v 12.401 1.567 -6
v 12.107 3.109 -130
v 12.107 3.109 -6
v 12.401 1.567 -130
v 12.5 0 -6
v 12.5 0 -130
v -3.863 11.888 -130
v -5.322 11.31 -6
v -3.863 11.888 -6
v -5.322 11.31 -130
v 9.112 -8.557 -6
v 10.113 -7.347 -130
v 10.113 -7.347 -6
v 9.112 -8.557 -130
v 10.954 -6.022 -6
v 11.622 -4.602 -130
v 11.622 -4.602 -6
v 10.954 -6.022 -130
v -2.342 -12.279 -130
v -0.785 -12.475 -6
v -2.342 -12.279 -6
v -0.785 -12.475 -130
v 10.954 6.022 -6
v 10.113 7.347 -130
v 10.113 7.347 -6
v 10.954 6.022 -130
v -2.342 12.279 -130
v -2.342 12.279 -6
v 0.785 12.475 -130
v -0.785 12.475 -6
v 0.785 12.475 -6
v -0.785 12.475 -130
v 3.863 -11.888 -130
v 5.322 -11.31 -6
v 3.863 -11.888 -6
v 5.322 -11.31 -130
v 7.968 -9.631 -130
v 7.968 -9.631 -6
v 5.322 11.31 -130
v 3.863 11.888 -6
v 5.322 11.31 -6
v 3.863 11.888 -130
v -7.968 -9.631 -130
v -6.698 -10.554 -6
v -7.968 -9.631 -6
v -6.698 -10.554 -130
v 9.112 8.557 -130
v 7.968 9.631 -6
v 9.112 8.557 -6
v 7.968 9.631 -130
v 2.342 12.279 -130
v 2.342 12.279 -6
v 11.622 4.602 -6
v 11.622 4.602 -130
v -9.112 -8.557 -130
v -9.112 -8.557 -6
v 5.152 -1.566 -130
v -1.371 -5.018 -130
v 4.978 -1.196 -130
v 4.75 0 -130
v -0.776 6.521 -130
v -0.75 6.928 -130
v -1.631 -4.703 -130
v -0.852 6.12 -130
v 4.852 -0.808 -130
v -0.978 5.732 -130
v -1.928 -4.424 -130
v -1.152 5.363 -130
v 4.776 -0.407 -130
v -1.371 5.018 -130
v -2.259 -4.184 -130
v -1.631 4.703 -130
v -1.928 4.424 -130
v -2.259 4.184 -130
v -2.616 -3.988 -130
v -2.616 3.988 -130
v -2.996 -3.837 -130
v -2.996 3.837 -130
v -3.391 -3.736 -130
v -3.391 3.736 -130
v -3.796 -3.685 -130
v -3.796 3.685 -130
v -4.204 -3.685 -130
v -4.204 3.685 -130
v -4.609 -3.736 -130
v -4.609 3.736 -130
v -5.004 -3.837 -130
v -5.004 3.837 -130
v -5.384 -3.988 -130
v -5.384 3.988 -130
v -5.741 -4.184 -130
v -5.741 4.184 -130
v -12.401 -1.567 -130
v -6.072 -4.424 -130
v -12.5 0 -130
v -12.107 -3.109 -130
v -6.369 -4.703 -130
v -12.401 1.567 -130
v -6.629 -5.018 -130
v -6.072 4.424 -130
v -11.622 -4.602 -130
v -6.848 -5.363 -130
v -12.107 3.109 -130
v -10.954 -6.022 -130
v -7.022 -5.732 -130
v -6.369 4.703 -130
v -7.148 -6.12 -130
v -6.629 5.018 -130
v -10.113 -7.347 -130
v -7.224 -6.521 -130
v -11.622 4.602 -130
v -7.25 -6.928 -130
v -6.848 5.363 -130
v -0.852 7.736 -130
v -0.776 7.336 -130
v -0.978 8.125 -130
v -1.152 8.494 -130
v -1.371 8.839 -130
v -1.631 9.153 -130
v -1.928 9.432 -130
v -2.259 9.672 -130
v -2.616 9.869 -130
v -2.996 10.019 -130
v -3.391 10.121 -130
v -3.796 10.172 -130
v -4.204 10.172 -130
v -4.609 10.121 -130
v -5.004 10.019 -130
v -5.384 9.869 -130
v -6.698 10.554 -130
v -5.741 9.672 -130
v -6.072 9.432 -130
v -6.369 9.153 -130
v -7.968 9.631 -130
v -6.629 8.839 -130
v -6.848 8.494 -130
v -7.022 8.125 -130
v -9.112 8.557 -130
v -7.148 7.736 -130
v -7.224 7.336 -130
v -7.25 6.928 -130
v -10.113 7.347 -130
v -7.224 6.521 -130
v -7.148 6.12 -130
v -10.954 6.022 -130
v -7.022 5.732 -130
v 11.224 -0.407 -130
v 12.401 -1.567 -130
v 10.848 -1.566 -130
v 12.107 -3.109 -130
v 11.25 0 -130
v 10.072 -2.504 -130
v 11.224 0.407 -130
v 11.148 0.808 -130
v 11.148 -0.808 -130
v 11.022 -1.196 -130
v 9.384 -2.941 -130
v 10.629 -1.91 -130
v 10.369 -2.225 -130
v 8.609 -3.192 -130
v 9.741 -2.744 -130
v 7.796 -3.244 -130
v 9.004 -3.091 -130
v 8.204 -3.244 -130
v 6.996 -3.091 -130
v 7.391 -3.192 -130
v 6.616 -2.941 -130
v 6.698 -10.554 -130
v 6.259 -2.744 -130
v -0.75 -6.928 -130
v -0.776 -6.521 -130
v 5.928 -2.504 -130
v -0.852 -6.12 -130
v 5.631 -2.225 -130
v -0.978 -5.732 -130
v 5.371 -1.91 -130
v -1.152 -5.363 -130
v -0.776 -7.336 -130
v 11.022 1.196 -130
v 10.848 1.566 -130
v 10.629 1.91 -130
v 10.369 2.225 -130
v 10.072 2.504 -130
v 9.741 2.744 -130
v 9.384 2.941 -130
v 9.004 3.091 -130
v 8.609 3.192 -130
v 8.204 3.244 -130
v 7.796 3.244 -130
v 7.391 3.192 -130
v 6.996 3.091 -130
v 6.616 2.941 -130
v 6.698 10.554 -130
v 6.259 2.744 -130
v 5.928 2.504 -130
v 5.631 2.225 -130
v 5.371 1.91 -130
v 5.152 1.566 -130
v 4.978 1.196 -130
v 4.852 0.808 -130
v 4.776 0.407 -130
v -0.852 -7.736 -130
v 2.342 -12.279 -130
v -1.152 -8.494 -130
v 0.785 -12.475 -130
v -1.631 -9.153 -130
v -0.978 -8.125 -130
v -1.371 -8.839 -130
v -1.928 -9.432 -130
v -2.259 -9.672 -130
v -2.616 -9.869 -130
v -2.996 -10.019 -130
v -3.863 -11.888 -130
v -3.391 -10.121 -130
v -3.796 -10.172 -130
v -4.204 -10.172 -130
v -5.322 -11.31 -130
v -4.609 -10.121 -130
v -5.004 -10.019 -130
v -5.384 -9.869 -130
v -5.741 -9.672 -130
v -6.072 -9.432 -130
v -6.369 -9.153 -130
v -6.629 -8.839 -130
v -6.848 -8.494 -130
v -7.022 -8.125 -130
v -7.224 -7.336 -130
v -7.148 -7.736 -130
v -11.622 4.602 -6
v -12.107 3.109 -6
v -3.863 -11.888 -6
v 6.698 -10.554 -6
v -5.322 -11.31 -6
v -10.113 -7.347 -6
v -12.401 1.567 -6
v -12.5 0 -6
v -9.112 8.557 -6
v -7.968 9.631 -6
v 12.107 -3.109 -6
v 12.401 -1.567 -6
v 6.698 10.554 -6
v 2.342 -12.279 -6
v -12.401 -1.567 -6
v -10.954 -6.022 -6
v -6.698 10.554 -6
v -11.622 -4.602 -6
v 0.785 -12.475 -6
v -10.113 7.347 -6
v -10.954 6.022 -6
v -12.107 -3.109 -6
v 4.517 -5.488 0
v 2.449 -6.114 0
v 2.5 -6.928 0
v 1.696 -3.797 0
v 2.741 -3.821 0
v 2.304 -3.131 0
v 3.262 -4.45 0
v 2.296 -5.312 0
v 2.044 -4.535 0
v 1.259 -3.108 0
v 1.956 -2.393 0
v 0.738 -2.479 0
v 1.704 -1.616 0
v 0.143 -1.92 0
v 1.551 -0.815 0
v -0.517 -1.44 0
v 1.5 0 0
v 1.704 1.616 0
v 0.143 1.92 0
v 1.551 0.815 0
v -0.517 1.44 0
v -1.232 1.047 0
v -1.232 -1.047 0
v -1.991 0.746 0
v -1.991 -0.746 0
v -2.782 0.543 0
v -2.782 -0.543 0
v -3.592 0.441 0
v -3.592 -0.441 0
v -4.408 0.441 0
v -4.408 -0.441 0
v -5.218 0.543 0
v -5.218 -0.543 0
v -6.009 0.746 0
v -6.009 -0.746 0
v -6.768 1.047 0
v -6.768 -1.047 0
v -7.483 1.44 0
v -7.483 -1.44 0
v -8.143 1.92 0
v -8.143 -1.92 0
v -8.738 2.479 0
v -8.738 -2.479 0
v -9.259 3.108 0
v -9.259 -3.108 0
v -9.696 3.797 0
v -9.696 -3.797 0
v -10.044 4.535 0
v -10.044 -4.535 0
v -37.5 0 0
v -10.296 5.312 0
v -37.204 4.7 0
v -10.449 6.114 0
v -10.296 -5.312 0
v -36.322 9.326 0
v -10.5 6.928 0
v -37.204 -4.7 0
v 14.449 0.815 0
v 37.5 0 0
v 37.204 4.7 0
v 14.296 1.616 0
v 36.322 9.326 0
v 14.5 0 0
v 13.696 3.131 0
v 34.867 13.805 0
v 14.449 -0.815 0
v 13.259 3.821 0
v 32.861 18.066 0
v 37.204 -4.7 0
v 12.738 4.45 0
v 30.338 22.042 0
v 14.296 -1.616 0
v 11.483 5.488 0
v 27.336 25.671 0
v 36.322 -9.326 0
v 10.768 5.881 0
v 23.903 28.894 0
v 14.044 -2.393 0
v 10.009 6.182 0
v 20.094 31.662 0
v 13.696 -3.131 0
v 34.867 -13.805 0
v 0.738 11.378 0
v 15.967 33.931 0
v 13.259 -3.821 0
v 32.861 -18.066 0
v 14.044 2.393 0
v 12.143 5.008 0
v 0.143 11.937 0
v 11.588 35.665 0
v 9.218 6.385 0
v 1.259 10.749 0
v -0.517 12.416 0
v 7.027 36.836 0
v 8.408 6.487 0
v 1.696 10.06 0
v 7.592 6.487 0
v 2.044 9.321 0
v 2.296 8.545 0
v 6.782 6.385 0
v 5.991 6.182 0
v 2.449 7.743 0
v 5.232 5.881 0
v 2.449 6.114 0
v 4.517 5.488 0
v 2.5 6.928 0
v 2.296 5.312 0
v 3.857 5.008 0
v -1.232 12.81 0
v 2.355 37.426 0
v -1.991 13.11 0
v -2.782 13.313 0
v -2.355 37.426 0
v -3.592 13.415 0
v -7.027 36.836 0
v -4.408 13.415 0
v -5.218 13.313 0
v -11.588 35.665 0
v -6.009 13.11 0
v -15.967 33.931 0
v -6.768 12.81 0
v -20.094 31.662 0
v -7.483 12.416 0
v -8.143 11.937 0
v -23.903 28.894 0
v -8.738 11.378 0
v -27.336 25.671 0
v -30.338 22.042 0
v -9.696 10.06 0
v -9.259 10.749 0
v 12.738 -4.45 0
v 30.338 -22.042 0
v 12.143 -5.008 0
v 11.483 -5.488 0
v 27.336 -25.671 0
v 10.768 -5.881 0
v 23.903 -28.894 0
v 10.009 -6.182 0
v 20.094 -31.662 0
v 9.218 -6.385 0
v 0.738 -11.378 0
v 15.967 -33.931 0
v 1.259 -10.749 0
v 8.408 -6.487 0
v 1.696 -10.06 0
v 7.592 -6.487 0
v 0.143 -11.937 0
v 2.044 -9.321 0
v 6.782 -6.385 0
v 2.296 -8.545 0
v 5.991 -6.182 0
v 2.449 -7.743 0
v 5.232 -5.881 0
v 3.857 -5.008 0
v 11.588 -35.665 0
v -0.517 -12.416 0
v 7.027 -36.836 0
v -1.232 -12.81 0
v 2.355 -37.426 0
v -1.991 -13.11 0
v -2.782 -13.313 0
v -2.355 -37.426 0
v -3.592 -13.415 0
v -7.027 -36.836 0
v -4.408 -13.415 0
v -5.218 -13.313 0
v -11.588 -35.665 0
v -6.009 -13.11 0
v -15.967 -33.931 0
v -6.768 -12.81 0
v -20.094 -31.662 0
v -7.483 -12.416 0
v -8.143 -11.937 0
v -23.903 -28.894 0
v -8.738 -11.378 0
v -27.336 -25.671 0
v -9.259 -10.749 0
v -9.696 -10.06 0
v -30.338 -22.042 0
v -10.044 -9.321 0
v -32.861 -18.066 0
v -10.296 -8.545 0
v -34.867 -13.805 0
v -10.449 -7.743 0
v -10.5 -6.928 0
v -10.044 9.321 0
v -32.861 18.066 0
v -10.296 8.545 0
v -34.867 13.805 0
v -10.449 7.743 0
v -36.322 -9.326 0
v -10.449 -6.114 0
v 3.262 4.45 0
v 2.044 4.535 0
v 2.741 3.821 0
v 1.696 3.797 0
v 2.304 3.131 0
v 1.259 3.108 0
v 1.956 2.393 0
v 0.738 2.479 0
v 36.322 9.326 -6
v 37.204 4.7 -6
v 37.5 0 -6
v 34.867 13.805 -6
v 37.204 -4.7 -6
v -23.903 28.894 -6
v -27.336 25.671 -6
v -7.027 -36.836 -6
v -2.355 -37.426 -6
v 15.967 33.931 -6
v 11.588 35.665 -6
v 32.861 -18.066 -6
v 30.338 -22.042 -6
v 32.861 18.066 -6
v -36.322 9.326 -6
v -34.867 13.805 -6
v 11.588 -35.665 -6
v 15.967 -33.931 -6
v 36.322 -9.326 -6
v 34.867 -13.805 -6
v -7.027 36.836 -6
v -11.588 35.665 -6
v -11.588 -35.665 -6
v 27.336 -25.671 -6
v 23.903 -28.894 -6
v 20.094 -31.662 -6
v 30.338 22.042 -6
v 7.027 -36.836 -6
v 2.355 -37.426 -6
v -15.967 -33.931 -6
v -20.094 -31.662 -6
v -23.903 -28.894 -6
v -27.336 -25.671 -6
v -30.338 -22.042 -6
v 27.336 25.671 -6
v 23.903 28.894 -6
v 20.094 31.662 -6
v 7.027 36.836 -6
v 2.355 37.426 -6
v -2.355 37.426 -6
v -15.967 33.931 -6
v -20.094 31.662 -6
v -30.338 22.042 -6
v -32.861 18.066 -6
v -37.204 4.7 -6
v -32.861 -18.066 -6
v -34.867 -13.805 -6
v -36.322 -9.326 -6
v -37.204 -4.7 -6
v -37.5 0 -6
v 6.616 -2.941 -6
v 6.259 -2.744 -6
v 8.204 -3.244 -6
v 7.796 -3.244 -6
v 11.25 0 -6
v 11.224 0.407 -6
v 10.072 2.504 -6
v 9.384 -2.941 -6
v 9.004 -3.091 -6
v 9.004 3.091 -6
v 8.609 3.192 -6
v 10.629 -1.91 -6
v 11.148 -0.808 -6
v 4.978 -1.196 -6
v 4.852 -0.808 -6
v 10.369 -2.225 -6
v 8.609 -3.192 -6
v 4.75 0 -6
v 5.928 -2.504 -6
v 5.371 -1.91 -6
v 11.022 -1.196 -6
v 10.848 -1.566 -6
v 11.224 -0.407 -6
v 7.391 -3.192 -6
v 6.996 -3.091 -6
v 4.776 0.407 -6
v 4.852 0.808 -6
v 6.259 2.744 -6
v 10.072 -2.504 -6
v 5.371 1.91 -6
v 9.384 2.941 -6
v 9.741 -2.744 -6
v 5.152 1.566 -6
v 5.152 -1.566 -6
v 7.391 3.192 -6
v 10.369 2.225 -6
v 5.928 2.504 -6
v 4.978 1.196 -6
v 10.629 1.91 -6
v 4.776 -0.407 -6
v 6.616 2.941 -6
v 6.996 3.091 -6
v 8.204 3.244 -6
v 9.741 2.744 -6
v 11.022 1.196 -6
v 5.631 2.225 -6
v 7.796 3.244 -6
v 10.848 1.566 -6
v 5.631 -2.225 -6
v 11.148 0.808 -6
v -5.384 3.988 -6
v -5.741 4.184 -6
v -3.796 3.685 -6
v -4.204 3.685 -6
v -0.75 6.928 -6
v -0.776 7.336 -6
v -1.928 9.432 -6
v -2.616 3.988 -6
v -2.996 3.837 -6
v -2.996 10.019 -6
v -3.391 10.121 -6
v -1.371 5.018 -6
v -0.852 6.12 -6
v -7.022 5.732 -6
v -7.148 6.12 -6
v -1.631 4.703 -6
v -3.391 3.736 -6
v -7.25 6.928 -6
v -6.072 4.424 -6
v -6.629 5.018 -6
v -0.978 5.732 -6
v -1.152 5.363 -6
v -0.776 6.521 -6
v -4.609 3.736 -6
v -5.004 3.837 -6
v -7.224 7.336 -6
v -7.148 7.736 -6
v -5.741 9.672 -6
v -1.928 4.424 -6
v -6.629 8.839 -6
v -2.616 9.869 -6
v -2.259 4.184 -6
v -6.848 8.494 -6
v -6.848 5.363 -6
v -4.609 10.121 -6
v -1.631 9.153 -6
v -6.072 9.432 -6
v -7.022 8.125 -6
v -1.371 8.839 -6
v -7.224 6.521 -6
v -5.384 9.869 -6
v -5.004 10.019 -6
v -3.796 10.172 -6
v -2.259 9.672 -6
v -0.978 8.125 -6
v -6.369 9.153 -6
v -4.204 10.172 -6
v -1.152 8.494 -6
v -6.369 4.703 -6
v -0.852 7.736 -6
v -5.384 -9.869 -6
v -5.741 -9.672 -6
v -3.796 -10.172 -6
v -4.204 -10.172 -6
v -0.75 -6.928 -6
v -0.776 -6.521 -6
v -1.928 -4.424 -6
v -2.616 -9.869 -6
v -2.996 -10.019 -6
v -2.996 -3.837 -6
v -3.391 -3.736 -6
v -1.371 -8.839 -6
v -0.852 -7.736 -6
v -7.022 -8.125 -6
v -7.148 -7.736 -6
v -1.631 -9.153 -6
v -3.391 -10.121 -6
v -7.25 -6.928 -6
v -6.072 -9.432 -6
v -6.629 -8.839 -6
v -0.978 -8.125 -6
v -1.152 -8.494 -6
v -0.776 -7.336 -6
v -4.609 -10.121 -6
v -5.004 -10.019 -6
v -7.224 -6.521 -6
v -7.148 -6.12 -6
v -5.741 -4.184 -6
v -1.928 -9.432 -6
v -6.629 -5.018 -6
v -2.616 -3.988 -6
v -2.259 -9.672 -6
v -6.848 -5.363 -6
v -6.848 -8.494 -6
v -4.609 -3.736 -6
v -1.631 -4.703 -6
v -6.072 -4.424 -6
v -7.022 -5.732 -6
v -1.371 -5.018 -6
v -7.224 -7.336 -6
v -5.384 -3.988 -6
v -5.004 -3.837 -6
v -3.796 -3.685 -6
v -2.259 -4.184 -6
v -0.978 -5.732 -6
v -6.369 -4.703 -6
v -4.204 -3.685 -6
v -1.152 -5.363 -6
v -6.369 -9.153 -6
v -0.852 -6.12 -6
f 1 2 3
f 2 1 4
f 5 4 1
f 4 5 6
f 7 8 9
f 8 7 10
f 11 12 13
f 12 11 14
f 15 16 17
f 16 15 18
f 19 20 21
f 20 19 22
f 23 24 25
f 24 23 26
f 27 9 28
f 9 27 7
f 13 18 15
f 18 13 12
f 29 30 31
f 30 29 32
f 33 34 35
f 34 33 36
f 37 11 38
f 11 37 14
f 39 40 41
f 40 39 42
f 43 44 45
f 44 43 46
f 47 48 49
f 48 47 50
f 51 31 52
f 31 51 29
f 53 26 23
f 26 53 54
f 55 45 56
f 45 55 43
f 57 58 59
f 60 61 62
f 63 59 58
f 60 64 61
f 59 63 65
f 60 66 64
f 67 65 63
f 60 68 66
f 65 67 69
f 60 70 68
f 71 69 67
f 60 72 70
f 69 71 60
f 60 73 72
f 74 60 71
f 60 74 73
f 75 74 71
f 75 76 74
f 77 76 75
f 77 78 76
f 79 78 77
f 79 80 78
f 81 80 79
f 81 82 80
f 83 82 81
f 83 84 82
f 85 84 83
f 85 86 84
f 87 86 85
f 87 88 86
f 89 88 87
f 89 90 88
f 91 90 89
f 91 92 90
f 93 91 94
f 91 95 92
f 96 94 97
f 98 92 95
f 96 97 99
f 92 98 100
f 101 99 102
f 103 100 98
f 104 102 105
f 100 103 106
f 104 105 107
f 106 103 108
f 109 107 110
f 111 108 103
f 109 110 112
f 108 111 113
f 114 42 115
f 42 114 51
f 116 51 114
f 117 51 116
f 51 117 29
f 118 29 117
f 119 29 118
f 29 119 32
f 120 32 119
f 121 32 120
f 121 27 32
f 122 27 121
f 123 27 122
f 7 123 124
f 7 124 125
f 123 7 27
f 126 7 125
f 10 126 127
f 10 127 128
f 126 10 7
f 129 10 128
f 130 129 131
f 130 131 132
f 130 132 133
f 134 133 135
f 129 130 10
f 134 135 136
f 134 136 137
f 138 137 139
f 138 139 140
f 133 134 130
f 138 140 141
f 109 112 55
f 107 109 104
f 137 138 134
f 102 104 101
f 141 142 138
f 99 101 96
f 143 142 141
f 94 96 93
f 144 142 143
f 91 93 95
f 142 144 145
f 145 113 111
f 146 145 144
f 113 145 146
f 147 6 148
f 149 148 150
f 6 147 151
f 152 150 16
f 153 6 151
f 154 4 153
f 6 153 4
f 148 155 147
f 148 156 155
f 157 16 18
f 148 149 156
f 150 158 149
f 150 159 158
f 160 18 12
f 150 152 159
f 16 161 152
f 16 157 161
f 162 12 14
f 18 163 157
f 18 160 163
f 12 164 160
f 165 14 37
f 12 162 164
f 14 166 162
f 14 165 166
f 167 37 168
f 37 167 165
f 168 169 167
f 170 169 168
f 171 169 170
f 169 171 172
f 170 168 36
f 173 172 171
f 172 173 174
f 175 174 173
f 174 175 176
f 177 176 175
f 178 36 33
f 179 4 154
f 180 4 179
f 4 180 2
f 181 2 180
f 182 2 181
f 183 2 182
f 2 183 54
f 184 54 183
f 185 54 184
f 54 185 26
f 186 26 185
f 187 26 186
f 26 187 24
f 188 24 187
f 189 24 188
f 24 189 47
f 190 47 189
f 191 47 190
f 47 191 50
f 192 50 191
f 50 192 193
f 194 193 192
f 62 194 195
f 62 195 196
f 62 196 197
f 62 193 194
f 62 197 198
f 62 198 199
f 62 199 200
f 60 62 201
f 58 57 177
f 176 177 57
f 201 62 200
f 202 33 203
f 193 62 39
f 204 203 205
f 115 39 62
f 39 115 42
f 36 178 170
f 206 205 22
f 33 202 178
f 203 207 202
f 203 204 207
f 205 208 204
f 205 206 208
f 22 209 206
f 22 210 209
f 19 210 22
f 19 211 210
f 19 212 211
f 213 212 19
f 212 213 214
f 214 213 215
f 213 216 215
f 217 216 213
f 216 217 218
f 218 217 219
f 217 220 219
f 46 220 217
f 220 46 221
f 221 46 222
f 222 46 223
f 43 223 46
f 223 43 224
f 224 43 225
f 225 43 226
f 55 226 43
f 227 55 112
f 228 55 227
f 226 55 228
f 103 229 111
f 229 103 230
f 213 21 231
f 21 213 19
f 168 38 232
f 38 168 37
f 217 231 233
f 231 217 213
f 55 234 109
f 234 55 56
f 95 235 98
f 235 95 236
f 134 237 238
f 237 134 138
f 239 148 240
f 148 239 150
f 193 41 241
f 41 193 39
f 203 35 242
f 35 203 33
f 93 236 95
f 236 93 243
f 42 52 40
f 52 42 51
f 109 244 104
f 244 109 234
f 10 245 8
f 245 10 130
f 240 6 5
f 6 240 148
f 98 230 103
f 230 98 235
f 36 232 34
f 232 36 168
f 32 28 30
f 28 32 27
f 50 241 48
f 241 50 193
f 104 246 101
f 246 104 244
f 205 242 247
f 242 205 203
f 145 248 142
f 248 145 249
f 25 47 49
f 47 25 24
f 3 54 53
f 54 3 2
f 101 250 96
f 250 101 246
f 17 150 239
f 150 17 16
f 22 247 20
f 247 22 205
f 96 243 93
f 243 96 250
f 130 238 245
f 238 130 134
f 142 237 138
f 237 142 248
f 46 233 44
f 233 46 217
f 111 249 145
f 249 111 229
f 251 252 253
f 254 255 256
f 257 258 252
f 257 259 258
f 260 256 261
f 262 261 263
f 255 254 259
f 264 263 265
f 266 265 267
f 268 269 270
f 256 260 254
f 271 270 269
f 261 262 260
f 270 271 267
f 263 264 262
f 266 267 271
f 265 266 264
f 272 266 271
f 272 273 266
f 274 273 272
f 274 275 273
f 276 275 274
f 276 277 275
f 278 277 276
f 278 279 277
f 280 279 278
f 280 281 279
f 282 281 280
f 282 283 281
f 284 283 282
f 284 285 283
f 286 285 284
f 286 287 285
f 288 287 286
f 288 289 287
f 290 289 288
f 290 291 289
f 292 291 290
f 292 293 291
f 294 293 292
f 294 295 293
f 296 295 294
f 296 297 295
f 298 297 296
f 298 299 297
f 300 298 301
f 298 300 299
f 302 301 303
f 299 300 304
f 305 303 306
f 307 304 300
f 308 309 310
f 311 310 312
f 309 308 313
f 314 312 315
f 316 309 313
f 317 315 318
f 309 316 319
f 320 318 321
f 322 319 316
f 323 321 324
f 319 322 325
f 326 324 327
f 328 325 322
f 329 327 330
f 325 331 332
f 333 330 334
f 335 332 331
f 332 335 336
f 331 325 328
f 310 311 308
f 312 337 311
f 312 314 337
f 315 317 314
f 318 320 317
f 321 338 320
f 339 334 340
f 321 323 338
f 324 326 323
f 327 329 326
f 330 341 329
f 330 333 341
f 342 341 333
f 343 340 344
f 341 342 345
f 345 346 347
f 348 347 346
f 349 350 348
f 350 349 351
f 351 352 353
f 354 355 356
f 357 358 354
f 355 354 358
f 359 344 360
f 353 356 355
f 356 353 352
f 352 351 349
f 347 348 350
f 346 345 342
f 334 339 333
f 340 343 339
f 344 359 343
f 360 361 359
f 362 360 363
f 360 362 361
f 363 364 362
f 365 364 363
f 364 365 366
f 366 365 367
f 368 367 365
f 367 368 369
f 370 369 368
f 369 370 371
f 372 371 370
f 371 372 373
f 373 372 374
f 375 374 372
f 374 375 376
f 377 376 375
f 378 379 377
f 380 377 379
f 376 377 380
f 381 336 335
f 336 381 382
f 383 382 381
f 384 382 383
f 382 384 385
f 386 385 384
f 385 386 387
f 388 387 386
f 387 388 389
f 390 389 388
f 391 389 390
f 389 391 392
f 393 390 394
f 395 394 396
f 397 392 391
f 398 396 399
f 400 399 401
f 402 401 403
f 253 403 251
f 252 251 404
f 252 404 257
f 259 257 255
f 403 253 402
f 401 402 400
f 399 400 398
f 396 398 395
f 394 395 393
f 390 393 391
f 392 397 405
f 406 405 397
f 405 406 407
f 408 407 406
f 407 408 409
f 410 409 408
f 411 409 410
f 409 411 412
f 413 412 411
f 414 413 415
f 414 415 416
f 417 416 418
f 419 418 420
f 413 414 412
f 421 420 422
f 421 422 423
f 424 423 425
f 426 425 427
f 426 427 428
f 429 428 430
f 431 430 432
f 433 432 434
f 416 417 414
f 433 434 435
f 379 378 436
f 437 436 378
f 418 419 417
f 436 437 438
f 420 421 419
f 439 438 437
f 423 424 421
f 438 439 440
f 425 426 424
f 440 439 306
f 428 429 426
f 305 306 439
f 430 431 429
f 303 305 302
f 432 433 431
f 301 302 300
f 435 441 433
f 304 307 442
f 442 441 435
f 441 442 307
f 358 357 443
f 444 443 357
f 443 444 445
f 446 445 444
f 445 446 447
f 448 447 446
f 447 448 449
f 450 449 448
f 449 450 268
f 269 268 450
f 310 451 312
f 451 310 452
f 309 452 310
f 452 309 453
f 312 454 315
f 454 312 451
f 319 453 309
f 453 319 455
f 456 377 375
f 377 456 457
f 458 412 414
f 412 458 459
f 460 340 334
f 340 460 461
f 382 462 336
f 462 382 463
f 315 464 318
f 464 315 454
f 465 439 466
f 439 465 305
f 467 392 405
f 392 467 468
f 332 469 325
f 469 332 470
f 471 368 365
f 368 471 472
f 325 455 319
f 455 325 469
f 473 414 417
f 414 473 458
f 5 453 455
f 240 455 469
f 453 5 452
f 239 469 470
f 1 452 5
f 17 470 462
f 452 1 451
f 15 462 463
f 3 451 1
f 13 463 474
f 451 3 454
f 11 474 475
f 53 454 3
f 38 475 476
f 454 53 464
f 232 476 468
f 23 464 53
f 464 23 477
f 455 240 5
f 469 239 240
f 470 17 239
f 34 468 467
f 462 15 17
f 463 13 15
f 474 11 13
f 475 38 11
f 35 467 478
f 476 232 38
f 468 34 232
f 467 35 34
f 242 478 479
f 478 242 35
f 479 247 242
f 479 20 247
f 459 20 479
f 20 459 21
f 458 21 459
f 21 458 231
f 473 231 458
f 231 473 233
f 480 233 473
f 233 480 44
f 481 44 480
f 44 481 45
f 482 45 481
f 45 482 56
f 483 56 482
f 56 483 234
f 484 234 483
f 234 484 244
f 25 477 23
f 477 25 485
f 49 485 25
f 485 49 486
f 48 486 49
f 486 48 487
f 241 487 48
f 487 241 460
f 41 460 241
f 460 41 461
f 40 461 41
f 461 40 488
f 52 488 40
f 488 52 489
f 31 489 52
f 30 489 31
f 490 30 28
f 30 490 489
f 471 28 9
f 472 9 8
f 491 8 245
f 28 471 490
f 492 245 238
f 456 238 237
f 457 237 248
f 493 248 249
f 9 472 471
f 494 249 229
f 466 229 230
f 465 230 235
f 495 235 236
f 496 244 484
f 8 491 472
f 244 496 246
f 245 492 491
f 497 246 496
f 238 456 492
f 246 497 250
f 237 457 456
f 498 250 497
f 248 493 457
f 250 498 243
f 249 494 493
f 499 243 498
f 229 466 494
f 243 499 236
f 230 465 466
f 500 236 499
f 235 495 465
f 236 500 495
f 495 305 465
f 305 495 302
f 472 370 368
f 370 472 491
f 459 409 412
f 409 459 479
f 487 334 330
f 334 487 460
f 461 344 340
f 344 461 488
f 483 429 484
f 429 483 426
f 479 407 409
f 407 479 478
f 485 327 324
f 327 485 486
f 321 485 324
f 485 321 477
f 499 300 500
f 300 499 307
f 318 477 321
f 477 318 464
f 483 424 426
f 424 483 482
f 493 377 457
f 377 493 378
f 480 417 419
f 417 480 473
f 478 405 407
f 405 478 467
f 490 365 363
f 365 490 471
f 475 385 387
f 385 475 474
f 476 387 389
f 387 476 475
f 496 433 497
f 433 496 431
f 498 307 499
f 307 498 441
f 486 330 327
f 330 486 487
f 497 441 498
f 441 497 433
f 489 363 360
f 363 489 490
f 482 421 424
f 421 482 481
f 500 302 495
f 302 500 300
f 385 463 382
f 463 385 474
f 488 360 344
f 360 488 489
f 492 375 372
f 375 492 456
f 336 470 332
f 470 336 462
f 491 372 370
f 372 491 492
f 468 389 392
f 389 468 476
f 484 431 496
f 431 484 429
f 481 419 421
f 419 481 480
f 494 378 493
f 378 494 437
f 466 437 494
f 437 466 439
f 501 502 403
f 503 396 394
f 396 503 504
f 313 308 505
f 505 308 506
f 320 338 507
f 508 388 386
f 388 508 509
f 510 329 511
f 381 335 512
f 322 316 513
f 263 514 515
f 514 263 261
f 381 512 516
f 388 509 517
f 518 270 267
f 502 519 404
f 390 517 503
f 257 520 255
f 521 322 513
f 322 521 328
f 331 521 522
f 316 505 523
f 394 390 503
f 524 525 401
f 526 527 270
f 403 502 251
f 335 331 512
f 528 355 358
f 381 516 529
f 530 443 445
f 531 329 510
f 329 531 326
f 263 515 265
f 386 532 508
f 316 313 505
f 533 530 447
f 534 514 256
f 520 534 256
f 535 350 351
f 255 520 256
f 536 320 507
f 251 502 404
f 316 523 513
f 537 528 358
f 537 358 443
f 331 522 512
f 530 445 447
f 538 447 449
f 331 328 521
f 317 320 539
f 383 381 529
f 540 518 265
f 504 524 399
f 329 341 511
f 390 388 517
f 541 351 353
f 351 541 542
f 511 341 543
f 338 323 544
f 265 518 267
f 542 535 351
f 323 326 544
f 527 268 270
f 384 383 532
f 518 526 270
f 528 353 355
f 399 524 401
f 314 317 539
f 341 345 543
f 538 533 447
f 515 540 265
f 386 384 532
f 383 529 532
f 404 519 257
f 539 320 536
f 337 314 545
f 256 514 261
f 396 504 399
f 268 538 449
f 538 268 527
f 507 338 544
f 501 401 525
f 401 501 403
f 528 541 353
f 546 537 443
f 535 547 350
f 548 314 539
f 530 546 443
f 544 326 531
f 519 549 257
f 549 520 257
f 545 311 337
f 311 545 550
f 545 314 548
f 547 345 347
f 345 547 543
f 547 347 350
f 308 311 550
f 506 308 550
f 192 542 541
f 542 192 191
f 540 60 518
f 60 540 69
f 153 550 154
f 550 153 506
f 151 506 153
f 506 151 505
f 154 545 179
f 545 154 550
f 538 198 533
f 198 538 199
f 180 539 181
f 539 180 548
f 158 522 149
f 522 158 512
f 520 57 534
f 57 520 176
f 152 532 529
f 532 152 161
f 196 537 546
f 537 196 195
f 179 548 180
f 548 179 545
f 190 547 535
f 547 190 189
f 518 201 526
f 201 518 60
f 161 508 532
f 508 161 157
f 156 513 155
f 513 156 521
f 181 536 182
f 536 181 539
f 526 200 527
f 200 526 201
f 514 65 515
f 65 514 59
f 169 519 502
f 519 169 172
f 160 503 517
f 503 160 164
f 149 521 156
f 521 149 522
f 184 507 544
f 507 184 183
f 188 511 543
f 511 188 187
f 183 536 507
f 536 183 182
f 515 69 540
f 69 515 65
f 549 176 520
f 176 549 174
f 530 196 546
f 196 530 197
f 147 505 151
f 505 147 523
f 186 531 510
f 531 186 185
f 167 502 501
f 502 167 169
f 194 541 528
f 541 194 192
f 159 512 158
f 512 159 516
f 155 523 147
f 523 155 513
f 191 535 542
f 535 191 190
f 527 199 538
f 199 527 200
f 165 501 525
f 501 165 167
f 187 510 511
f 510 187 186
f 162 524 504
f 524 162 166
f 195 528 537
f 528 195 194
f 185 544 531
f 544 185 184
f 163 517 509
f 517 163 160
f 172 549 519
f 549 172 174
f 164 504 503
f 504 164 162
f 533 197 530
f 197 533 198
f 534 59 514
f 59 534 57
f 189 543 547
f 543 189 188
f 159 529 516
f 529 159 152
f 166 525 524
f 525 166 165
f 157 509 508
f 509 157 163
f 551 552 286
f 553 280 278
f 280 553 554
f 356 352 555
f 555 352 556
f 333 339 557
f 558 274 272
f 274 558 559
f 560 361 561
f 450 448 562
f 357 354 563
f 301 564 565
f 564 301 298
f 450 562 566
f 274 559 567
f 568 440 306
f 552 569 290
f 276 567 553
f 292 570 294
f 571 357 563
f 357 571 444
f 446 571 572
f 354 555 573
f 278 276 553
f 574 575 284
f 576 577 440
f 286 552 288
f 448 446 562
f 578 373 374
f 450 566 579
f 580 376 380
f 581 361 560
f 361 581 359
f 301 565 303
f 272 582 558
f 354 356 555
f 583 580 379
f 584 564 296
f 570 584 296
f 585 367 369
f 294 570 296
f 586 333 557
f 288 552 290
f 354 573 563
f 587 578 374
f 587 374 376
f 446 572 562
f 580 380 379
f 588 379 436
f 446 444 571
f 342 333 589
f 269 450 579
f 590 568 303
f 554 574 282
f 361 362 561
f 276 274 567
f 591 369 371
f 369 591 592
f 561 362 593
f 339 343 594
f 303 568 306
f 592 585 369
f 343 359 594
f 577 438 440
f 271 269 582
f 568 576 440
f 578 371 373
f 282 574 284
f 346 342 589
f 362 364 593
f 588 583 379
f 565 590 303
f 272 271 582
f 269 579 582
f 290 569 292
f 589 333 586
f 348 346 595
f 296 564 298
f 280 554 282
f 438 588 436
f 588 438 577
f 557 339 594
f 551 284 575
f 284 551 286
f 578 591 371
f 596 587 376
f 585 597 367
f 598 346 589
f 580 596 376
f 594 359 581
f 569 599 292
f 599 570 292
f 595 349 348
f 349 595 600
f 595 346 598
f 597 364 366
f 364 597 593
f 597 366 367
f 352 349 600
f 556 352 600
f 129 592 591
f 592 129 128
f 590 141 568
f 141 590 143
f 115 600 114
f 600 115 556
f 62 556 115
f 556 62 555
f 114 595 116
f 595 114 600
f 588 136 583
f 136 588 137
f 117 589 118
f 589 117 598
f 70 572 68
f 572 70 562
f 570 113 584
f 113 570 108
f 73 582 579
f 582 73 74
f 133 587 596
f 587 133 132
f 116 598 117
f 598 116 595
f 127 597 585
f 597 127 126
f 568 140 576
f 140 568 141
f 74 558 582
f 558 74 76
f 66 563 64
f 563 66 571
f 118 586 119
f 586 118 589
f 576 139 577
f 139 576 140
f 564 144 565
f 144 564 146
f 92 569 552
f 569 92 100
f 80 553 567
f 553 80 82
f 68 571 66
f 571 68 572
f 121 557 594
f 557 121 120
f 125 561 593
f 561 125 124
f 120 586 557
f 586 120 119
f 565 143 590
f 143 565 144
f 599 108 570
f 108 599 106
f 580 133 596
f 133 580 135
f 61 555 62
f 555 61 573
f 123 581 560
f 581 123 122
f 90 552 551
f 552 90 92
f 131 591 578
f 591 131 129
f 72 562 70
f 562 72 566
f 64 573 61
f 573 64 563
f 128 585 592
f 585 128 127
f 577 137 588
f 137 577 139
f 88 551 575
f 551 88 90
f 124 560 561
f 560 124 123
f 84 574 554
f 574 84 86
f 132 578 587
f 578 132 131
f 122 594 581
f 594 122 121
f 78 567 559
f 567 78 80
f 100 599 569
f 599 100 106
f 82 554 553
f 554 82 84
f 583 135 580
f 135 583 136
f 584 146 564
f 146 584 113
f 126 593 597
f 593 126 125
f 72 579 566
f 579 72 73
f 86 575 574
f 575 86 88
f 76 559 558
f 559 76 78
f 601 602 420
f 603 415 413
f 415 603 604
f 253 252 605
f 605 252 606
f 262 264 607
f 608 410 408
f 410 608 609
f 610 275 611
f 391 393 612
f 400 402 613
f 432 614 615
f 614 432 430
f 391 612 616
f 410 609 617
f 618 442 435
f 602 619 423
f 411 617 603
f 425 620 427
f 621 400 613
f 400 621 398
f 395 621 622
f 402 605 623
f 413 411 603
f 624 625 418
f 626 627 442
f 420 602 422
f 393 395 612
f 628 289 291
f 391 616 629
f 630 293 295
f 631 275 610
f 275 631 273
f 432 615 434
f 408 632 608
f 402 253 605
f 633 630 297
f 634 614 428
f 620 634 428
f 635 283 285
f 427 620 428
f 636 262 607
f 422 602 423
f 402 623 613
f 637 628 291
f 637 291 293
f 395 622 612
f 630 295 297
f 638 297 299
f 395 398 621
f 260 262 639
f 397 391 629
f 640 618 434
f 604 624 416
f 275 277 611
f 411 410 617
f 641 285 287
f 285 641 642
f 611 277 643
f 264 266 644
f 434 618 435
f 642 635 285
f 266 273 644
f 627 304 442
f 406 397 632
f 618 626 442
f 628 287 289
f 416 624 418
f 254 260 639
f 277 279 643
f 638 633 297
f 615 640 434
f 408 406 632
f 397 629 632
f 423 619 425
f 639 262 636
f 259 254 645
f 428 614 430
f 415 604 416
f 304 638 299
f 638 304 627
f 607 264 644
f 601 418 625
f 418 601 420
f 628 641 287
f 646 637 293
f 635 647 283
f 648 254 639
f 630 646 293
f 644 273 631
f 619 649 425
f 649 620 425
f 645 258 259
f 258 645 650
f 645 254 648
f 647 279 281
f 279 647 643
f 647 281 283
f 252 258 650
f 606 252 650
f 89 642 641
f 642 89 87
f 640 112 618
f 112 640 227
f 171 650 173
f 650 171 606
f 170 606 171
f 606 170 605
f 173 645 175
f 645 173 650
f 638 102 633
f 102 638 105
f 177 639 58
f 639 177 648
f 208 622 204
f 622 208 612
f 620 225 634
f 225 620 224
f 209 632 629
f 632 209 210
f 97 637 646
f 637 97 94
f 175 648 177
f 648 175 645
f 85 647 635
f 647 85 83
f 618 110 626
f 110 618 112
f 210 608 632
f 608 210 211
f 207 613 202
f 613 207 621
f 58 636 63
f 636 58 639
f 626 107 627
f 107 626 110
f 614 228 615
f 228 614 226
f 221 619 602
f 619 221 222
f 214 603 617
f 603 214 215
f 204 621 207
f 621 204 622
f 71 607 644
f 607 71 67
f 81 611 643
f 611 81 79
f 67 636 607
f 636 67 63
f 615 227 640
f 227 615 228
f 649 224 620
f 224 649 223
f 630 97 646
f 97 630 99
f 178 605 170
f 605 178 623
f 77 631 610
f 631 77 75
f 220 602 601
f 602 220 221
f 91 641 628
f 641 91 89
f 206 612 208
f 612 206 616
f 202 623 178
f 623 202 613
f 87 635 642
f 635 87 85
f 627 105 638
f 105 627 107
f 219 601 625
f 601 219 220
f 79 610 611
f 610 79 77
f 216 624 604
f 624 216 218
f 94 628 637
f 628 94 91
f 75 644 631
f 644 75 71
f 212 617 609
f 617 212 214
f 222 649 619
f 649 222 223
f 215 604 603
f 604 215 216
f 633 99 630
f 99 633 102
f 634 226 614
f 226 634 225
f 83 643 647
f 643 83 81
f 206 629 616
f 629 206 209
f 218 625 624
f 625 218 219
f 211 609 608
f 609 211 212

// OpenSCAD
$fn = 50;


difference() {
	union() {
		translate(v = [0, 0, -130.0000000000]) {
			cylinder(h = 130, r = 12.5000000000);
		}
		translate(v = [0, 0, -6.0000000000]) {
			cylinder(h = 6, r = 37.5000000000);
		}
	}
	union() {
		translate(v = [8.0000000000, 0.0000000000, 0]) {
			rotate(a = [0, 0, 0]) {
				difference() {
					union() {
						#translate(v = [0, 0, -130.0000000000]) {
							cylinder(h = 130, r = 2.2500000000);
						}
						#translate(v = [0, 0, -6]) {
							cylinder(h = 6, r = 12.5000000000, r1 = 3.2500000000, r2 = 6.5000000000);
						}
						#translate(v = [0, 0, -130.0000000000]) {
							cylinder(h = 130, r = 3.2500000000);
						}
						#translate(v = [0, 0, -130.0000000000]) {
							cylinder(h = 130, r = 2.2500000000);
						}
					}
					union();
				}
			}
		}
		translate(v = [-4.0000000000, 6.9282032303, 0]) {
			rotate(a = [0, 0, 0]) {
				difference() {
					union() {
						#translate(v = [0, 0, -130.0000000000]) {
							cylinder(h = 130, r = 2.2500000000);
						}
						#translate(v = [0, 0, -6]) {
							cylinder(h = 6, r = 12.5000000000, r1 = 3.2500000000, r2 = 6.5000000000);
						}
						#translate(v = [0, 0, -130.0000000000]) {
							cylinder(h = 130, r = 3.2500000000);
						}
						#translate(v = [0, 0, -130.0000000000]) {
							cylinder(h = 130, r = 2.2500000000);
						}
					}
					union();
				}
			}
		}
		translate(v = [-4.0000000000, -6.9282032303, 0]) {
			rotate(a = [0, 0, 0]) {
				difference() {
					union() {
						#translate(v = [0, 0, -130.0000000000]) {
							cylinder(h = 130, r = 2.2500000000);
						}
						#translate(v = [0, 0, -6]) {
							cylinder(h = 6, r = 12.5000000000, r1 = 3.2500000000, r2 = 6.5000000000);
						}
						#translate(v = [0, 0, -130.0000000000]) {
							cylinder(h = 130, r = 3.2500000000);
						}
						#translate(v = [0, 0, -130.0000000000]) {
							cylinder(h = 130, r = 2.2500000000);
						}
					}
					union();
				}
			}
		}
	}
}
